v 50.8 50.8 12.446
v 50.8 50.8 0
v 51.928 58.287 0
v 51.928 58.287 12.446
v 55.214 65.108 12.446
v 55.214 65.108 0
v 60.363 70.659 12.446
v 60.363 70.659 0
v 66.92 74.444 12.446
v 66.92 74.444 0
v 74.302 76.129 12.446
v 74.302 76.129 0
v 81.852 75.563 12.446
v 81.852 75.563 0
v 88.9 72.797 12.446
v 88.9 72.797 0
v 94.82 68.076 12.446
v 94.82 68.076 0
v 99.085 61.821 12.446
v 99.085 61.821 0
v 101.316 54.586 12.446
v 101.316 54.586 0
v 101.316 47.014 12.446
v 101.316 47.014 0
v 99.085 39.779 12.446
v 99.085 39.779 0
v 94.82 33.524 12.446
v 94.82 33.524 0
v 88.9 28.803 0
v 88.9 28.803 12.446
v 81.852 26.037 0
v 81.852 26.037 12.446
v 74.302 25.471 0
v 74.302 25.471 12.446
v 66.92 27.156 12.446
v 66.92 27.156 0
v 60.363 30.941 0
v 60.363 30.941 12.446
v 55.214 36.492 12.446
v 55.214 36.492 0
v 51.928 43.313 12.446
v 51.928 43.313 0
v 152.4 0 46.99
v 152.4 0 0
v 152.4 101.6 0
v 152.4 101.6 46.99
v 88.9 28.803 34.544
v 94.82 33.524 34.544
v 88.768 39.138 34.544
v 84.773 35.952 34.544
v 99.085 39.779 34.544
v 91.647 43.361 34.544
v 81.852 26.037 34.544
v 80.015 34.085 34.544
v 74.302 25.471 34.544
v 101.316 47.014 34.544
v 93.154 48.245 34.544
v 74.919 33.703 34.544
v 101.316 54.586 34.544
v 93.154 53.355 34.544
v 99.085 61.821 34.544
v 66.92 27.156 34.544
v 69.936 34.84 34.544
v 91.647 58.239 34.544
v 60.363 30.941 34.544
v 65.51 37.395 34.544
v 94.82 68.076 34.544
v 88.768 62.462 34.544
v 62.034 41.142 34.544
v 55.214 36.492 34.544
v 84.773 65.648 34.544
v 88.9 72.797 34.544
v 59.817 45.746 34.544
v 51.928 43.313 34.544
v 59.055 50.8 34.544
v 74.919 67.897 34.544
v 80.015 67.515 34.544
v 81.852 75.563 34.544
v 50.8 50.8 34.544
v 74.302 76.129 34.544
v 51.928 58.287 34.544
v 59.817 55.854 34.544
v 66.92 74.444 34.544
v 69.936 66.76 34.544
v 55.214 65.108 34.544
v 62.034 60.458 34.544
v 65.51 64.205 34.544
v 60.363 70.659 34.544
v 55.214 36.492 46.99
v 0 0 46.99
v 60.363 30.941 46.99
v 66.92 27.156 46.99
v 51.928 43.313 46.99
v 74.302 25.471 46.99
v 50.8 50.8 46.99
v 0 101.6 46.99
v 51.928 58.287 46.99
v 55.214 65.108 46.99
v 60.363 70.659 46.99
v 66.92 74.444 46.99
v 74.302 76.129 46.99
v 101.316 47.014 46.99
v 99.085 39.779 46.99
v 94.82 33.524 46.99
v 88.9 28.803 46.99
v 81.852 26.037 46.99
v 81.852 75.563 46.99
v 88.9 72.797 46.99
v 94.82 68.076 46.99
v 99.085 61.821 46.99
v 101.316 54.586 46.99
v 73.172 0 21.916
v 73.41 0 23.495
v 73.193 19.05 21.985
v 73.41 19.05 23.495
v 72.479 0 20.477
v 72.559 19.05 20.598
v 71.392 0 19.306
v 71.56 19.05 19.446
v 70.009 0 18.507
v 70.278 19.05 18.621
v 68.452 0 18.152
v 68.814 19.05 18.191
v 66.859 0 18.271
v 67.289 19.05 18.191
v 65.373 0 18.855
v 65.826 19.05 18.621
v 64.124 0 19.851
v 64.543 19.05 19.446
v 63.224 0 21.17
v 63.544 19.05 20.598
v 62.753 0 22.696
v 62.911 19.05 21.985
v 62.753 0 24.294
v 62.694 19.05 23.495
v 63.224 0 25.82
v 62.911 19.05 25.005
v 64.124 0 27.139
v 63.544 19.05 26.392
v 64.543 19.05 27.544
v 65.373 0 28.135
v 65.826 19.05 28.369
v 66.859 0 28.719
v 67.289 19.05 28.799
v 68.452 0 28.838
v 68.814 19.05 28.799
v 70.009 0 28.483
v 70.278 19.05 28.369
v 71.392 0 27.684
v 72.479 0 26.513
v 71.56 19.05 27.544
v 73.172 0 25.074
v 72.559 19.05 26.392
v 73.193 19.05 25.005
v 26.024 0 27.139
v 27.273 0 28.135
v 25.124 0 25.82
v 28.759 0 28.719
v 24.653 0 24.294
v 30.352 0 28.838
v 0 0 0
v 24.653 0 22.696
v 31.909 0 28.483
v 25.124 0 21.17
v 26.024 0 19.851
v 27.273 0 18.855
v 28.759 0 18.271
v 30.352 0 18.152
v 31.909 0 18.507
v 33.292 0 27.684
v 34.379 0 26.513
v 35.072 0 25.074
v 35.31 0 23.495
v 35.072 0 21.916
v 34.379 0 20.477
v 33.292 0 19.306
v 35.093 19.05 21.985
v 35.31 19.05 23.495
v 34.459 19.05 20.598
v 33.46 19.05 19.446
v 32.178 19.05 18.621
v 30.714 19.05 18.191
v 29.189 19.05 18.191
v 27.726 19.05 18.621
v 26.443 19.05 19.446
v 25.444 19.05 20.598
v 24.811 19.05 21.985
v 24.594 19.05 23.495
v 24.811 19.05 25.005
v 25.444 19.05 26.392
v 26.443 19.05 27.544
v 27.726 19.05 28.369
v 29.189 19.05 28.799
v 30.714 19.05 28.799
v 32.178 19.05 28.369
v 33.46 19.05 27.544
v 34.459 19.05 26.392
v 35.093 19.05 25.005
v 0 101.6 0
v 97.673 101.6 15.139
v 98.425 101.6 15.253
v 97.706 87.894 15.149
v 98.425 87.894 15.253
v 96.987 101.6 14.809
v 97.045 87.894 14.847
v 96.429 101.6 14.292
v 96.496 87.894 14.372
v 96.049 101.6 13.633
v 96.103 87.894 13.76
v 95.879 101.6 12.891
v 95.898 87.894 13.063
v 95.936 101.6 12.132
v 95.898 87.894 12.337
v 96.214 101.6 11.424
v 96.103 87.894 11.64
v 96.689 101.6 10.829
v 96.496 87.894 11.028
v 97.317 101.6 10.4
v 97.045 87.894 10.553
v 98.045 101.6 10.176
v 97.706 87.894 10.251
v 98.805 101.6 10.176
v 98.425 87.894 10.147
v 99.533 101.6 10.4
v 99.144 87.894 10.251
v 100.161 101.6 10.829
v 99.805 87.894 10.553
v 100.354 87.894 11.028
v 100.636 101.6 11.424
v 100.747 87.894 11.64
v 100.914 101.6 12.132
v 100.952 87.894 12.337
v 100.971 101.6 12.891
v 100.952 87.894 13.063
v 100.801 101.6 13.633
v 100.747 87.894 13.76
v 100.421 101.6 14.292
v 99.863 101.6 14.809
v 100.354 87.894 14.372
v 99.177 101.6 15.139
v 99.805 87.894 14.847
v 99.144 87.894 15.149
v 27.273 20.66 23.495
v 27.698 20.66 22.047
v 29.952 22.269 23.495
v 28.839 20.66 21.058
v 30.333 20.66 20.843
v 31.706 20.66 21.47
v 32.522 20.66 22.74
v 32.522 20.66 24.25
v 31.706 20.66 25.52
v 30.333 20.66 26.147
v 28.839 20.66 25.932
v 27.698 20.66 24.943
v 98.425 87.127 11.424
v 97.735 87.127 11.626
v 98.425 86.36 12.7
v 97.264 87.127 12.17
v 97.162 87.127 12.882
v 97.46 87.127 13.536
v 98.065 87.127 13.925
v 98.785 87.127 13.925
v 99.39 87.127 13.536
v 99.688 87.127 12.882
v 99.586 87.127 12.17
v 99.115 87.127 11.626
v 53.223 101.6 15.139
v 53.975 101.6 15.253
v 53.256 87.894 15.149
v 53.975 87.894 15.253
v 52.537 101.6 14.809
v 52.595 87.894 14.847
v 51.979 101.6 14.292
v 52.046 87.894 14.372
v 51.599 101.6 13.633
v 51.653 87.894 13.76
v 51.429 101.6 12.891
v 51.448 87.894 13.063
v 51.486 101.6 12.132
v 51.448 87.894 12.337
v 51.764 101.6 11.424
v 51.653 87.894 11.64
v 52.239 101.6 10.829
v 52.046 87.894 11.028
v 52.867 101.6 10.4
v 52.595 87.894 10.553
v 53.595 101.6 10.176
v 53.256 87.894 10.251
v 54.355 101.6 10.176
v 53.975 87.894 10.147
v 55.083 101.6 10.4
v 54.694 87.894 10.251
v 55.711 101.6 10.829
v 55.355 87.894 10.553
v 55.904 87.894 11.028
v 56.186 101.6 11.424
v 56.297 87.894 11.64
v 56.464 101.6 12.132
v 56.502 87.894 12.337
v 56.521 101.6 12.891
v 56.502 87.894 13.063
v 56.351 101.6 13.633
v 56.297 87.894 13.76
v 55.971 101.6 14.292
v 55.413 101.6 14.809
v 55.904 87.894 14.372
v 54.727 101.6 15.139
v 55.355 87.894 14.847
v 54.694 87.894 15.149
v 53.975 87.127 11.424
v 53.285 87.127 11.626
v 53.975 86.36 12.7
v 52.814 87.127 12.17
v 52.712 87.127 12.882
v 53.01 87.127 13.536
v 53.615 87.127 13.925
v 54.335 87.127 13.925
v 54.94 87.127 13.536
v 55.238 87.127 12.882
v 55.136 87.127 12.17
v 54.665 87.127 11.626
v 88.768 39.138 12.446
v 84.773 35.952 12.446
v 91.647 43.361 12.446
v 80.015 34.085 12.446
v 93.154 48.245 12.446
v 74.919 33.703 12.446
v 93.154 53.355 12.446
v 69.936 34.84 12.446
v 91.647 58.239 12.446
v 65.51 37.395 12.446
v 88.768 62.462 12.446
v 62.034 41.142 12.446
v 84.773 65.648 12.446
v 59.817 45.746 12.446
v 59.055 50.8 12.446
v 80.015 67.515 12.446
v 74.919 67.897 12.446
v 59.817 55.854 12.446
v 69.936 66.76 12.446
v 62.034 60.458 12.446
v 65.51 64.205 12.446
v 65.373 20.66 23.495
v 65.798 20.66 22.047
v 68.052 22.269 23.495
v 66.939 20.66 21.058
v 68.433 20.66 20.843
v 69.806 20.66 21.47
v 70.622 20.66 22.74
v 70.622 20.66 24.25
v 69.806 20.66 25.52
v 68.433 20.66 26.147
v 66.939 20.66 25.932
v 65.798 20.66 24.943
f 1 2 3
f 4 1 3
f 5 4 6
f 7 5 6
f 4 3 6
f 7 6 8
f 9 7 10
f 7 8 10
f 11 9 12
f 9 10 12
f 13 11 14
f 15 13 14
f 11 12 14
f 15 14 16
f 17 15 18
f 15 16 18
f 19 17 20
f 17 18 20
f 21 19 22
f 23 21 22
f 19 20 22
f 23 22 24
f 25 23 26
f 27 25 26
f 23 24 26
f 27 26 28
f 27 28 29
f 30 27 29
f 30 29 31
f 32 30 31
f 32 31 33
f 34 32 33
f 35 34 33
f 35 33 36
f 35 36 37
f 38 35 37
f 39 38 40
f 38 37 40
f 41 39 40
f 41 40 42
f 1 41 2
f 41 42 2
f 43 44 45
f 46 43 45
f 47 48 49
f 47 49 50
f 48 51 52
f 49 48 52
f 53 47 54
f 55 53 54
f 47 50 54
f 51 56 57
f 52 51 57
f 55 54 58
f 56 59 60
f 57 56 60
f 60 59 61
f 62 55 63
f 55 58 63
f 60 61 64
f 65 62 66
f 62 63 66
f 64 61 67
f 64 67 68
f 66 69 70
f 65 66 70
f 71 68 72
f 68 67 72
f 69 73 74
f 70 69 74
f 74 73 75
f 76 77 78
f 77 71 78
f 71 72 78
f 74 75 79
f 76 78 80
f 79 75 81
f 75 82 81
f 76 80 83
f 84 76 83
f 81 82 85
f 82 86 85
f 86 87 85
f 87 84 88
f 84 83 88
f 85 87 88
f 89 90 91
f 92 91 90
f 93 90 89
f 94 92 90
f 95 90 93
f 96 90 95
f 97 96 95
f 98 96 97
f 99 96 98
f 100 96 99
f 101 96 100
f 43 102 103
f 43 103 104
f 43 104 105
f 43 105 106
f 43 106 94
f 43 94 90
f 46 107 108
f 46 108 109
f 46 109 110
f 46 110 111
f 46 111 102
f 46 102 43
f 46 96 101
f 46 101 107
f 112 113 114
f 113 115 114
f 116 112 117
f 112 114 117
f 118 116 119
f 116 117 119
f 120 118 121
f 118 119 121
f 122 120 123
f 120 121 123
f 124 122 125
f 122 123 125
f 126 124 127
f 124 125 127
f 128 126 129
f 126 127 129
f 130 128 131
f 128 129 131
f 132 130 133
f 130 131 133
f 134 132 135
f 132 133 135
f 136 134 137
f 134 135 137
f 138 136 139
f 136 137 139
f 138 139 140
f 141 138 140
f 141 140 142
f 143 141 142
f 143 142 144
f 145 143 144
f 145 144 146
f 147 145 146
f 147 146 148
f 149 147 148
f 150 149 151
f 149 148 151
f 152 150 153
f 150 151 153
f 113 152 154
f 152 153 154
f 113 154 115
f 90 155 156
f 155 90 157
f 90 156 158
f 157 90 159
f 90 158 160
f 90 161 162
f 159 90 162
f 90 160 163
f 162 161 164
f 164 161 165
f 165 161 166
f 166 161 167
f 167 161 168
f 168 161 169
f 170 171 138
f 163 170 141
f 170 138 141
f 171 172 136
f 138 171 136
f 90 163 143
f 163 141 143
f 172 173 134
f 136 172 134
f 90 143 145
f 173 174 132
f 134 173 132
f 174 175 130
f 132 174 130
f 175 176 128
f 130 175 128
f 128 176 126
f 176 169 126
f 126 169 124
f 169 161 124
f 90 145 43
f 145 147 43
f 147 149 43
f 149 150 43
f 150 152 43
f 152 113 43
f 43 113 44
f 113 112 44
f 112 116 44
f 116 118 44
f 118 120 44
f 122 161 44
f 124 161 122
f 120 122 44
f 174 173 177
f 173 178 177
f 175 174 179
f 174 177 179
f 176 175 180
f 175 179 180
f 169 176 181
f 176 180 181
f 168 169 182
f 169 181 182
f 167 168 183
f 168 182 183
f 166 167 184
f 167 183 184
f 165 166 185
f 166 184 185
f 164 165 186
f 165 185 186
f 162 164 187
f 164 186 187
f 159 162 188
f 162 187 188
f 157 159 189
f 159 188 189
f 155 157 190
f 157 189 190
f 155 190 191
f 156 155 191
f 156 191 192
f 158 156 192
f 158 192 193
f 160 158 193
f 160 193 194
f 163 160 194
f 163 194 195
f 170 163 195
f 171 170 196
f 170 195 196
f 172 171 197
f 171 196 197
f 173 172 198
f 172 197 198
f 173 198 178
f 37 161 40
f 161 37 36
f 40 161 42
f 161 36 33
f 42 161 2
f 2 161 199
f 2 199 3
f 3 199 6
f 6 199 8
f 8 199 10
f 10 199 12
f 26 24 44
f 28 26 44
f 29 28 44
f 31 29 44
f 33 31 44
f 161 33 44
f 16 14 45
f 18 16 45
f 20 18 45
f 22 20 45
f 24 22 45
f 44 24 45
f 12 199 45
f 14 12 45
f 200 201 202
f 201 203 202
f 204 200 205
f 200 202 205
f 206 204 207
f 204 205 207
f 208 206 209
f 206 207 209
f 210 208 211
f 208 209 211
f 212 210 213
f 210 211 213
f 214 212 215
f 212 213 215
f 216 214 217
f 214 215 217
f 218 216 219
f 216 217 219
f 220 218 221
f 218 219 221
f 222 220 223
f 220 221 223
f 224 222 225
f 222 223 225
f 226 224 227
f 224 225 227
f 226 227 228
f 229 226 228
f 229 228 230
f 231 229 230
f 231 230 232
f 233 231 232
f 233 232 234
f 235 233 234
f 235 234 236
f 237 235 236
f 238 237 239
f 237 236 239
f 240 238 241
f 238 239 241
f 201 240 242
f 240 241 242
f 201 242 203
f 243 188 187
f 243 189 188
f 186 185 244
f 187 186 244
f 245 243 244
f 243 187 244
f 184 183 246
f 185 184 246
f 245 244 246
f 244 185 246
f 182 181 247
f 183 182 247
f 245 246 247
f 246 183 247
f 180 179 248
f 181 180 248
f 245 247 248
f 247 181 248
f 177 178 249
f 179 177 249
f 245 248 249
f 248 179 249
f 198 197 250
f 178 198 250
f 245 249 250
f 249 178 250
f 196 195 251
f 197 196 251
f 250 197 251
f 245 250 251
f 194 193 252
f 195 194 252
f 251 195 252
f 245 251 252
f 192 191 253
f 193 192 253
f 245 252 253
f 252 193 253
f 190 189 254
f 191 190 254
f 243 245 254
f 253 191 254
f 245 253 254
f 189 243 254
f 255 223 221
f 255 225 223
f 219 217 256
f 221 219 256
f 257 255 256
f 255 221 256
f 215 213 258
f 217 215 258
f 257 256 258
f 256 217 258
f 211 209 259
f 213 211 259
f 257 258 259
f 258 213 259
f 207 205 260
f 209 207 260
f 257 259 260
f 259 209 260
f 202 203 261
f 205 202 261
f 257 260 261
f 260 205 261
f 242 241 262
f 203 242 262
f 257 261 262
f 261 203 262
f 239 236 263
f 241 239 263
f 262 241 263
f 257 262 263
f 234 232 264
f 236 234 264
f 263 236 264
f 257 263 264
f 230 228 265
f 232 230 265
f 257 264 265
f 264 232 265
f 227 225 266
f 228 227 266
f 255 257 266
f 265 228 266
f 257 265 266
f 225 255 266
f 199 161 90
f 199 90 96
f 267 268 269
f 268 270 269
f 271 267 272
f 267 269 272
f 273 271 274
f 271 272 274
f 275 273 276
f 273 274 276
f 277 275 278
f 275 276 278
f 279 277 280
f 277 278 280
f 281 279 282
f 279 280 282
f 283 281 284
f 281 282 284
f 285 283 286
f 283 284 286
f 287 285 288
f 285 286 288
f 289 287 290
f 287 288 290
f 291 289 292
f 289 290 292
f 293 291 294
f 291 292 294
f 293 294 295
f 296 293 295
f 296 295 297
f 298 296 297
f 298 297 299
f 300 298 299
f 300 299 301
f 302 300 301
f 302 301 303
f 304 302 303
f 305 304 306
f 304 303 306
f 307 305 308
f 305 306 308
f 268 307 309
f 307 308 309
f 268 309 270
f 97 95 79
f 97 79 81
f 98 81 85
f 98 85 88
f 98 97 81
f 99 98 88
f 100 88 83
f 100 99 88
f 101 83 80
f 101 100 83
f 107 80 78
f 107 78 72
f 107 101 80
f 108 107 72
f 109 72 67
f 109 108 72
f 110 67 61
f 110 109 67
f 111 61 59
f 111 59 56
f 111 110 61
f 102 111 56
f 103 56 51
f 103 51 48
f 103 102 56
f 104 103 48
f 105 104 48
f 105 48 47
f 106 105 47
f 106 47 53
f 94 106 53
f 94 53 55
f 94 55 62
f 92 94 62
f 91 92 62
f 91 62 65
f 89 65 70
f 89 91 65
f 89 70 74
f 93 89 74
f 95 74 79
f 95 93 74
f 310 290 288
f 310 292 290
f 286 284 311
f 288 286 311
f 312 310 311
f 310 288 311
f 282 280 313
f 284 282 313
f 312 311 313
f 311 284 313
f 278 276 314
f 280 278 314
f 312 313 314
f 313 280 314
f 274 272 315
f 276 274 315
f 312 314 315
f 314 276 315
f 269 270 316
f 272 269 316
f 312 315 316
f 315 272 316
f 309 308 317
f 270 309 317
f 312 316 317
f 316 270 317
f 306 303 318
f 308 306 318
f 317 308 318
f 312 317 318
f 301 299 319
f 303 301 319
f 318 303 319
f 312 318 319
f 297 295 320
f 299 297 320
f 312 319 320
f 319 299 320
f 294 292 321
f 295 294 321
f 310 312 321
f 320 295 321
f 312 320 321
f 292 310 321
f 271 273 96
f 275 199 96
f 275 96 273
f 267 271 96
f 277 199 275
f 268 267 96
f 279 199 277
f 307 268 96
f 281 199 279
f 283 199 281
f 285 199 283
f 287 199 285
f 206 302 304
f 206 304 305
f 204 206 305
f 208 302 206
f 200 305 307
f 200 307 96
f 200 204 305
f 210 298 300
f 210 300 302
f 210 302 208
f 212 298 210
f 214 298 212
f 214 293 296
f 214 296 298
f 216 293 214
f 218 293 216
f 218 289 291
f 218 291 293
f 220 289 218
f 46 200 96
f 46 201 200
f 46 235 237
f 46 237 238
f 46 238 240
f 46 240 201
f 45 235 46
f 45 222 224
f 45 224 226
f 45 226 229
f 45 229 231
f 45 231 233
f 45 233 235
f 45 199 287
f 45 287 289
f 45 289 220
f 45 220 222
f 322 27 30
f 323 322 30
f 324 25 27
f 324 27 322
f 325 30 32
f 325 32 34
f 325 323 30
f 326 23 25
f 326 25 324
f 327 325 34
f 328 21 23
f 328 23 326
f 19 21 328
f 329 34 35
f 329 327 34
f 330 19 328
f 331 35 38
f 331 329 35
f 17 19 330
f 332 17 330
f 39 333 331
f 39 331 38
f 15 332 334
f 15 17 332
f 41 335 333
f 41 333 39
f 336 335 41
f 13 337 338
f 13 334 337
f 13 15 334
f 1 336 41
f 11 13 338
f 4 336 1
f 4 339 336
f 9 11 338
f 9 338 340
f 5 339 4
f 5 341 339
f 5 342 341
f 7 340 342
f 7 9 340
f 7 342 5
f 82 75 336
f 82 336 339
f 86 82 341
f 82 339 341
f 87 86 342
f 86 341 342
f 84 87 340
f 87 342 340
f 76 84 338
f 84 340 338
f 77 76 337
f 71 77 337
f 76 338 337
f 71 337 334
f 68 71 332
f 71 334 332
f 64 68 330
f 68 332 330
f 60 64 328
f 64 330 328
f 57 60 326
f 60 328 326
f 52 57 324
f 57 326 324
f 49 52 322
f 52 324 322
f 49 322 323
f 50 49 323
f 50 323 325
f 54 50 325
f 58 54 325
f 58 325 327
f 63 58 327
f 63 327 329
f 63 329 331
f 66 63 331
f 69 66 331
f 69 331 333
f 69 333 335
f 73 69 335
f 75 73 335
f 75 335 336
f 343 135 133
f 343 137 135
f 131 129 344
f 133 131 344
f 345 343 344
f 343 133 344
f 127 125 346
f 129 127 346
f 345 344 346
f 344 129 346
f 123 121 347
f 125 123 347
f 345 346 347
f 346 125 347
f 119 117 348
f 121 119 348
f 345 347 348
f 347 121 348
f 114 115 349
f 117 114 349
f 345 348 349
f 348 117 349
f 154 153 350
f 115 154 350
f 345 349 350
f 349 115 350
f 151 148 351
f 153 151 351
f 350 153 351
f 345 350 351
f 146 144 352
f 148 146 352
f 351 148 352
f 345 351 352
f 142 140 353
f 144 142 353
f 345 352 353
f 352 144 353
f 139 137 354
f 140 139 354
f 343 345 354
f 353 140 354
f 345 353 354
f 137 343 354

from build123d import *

# Parameters (mm, degrees)
SKETCH1_W                       = 152.4
SKETCH1_H                       = 101.6
BOSS_EXTRUDE1_DEPTH             = 46.99
SKETCH2_R                       = 17.145
CUT_EXTRUDE1_DEPTH              = 190.093574983
SKETCH2_2_R                     = 25.4
SKETCH2_2_R_2                   = 17.145
CUT_EXTRUDE3_DEPTH              = 12.446
TAP_DRILL_FOR_1_2_13_TAP1_D     = 10.71626
TAP_DRILL_FOR_1_2_13_TAP1_DEPTH = 19.05
TAP_DRILL_FOR_1_2_13_TAP1_TIP   = 3.219489309
TAP_DRILL_FOR_1_4_20_TAP1_D     = 5.1054
TAP_DRILL_FOR_1_4_20_TAP1_DEPTH = 13.706183098
TAP_DRILL_FOR_1_4_20_TAP1_TIP   = 1.533816902


with BuildPart() as part:
    # Sketch1 → Boss-Extrude1 (new body)
    with BuildSketch(Plane.XY):
        with Locations((76.2, 50.8)):
            Rectangle(SKETCH1_W, SKETCH1_H)
    extrude(amount=BOSS_EXTRUDE1_DEPTH)

    # Sketch2 → Cut-Extrude1 (cut, through all)
    with BuildSketch(Plane(origin=(0, 0, 0), x_dir=(-1, 0, 0), z_dir=(0, 0, -1))):
        with Locations((-76.2, 50.8)):
            Circle(SKETCH2_R)
    extrude(amount=-CUT_EXTRUDE1_DEPTH, mode=Mode.SUBTRACT)

    # Sketch2<2> → Cut-Extrude3 (cut)
    with BuildSketch(Plane(origin=(0, 0, 0), x_dir=(-1, 0, 0), z_dir=(0, 0, -1))):
        with Locations((-76.2, 50.8)):
            Circle(SKETCH2_2_R)
        with Locations((-76.2, 50.8)):
            Circle(SKETCH2_2_R_2, mode=Mode.SUBTRACT)
    cut_extrude3 = extrude(amount=-CUT_EXTRUDE3_DEPTH, mode=Mode.SUBTRACT)

    # Mirror2: Cut-Extrude3 across plane
    add(cut_extrude3.mirror(Plane(origin=(0, 0, 23.495), x_dir=(1, 0, 0), z_dir=(0, 0, -1))), mode=Mode.SUBTRACT)

    # Tap Drill for 1/2-13 Tap1
    with Locations(Plane(origin=(0, 0, 0), x_dir=(-1, 0, 0), z_dir=(0, -1, 0))):
        with Locations((-68.051669078, -23.495), (-29.951669078, -23.495)):
            Hole(TAP_DRILL_FOR_1_2_13_TAP1_D / 2, depth=TAP_DRILL_FOR_1_2_13_TAP1_DEPTH)
            with Locations((0, 0, -(TAP_DRILL_FOR_1_2_13_TAP1_DEPTH + TAP_DRILL_FOR_1_2_13_TAP1_TIP / 2))):  # 118° drill point
                Cone(0, TAP_DRILL_FOR_1_2_13_TAP1_D / 2, TAP_DRILL_FOR_1_2_13_TAP1_TIP, mode=Mode.SUBTRACT)

    # Tap Drill for 1/4-20 Tap1
    with Locations(Plane(origin=(50.8, 101.6, 0), x_dir=(0, 0, -1), z_dir=(0, 1, 0))):
        with Locations((-12.7, -47.625), (-12.7, -3.175)):
            Hole(TAP_DRILL_FOR_1_4_20_TAP1_D / 2, depth=TAP_DRILL_FOR_1_4_20_TAP1_DEPTH)
            with Locations((0, 0, -(TAP_DRILL_FOR_1_4_20_TAP1_DEPTH + TAP_DRILL_FOR_1_4_20_TAP1_TIP / 2))):  # 118° drill point
                Cone(0, TAP_DRILL_FOR_1_4_20_TAP1_D / 2, TAP_DRILL_FOR_1_4_20_TAP1_TIP, mode=Mode.SUBTRACT)


solid = part.part
